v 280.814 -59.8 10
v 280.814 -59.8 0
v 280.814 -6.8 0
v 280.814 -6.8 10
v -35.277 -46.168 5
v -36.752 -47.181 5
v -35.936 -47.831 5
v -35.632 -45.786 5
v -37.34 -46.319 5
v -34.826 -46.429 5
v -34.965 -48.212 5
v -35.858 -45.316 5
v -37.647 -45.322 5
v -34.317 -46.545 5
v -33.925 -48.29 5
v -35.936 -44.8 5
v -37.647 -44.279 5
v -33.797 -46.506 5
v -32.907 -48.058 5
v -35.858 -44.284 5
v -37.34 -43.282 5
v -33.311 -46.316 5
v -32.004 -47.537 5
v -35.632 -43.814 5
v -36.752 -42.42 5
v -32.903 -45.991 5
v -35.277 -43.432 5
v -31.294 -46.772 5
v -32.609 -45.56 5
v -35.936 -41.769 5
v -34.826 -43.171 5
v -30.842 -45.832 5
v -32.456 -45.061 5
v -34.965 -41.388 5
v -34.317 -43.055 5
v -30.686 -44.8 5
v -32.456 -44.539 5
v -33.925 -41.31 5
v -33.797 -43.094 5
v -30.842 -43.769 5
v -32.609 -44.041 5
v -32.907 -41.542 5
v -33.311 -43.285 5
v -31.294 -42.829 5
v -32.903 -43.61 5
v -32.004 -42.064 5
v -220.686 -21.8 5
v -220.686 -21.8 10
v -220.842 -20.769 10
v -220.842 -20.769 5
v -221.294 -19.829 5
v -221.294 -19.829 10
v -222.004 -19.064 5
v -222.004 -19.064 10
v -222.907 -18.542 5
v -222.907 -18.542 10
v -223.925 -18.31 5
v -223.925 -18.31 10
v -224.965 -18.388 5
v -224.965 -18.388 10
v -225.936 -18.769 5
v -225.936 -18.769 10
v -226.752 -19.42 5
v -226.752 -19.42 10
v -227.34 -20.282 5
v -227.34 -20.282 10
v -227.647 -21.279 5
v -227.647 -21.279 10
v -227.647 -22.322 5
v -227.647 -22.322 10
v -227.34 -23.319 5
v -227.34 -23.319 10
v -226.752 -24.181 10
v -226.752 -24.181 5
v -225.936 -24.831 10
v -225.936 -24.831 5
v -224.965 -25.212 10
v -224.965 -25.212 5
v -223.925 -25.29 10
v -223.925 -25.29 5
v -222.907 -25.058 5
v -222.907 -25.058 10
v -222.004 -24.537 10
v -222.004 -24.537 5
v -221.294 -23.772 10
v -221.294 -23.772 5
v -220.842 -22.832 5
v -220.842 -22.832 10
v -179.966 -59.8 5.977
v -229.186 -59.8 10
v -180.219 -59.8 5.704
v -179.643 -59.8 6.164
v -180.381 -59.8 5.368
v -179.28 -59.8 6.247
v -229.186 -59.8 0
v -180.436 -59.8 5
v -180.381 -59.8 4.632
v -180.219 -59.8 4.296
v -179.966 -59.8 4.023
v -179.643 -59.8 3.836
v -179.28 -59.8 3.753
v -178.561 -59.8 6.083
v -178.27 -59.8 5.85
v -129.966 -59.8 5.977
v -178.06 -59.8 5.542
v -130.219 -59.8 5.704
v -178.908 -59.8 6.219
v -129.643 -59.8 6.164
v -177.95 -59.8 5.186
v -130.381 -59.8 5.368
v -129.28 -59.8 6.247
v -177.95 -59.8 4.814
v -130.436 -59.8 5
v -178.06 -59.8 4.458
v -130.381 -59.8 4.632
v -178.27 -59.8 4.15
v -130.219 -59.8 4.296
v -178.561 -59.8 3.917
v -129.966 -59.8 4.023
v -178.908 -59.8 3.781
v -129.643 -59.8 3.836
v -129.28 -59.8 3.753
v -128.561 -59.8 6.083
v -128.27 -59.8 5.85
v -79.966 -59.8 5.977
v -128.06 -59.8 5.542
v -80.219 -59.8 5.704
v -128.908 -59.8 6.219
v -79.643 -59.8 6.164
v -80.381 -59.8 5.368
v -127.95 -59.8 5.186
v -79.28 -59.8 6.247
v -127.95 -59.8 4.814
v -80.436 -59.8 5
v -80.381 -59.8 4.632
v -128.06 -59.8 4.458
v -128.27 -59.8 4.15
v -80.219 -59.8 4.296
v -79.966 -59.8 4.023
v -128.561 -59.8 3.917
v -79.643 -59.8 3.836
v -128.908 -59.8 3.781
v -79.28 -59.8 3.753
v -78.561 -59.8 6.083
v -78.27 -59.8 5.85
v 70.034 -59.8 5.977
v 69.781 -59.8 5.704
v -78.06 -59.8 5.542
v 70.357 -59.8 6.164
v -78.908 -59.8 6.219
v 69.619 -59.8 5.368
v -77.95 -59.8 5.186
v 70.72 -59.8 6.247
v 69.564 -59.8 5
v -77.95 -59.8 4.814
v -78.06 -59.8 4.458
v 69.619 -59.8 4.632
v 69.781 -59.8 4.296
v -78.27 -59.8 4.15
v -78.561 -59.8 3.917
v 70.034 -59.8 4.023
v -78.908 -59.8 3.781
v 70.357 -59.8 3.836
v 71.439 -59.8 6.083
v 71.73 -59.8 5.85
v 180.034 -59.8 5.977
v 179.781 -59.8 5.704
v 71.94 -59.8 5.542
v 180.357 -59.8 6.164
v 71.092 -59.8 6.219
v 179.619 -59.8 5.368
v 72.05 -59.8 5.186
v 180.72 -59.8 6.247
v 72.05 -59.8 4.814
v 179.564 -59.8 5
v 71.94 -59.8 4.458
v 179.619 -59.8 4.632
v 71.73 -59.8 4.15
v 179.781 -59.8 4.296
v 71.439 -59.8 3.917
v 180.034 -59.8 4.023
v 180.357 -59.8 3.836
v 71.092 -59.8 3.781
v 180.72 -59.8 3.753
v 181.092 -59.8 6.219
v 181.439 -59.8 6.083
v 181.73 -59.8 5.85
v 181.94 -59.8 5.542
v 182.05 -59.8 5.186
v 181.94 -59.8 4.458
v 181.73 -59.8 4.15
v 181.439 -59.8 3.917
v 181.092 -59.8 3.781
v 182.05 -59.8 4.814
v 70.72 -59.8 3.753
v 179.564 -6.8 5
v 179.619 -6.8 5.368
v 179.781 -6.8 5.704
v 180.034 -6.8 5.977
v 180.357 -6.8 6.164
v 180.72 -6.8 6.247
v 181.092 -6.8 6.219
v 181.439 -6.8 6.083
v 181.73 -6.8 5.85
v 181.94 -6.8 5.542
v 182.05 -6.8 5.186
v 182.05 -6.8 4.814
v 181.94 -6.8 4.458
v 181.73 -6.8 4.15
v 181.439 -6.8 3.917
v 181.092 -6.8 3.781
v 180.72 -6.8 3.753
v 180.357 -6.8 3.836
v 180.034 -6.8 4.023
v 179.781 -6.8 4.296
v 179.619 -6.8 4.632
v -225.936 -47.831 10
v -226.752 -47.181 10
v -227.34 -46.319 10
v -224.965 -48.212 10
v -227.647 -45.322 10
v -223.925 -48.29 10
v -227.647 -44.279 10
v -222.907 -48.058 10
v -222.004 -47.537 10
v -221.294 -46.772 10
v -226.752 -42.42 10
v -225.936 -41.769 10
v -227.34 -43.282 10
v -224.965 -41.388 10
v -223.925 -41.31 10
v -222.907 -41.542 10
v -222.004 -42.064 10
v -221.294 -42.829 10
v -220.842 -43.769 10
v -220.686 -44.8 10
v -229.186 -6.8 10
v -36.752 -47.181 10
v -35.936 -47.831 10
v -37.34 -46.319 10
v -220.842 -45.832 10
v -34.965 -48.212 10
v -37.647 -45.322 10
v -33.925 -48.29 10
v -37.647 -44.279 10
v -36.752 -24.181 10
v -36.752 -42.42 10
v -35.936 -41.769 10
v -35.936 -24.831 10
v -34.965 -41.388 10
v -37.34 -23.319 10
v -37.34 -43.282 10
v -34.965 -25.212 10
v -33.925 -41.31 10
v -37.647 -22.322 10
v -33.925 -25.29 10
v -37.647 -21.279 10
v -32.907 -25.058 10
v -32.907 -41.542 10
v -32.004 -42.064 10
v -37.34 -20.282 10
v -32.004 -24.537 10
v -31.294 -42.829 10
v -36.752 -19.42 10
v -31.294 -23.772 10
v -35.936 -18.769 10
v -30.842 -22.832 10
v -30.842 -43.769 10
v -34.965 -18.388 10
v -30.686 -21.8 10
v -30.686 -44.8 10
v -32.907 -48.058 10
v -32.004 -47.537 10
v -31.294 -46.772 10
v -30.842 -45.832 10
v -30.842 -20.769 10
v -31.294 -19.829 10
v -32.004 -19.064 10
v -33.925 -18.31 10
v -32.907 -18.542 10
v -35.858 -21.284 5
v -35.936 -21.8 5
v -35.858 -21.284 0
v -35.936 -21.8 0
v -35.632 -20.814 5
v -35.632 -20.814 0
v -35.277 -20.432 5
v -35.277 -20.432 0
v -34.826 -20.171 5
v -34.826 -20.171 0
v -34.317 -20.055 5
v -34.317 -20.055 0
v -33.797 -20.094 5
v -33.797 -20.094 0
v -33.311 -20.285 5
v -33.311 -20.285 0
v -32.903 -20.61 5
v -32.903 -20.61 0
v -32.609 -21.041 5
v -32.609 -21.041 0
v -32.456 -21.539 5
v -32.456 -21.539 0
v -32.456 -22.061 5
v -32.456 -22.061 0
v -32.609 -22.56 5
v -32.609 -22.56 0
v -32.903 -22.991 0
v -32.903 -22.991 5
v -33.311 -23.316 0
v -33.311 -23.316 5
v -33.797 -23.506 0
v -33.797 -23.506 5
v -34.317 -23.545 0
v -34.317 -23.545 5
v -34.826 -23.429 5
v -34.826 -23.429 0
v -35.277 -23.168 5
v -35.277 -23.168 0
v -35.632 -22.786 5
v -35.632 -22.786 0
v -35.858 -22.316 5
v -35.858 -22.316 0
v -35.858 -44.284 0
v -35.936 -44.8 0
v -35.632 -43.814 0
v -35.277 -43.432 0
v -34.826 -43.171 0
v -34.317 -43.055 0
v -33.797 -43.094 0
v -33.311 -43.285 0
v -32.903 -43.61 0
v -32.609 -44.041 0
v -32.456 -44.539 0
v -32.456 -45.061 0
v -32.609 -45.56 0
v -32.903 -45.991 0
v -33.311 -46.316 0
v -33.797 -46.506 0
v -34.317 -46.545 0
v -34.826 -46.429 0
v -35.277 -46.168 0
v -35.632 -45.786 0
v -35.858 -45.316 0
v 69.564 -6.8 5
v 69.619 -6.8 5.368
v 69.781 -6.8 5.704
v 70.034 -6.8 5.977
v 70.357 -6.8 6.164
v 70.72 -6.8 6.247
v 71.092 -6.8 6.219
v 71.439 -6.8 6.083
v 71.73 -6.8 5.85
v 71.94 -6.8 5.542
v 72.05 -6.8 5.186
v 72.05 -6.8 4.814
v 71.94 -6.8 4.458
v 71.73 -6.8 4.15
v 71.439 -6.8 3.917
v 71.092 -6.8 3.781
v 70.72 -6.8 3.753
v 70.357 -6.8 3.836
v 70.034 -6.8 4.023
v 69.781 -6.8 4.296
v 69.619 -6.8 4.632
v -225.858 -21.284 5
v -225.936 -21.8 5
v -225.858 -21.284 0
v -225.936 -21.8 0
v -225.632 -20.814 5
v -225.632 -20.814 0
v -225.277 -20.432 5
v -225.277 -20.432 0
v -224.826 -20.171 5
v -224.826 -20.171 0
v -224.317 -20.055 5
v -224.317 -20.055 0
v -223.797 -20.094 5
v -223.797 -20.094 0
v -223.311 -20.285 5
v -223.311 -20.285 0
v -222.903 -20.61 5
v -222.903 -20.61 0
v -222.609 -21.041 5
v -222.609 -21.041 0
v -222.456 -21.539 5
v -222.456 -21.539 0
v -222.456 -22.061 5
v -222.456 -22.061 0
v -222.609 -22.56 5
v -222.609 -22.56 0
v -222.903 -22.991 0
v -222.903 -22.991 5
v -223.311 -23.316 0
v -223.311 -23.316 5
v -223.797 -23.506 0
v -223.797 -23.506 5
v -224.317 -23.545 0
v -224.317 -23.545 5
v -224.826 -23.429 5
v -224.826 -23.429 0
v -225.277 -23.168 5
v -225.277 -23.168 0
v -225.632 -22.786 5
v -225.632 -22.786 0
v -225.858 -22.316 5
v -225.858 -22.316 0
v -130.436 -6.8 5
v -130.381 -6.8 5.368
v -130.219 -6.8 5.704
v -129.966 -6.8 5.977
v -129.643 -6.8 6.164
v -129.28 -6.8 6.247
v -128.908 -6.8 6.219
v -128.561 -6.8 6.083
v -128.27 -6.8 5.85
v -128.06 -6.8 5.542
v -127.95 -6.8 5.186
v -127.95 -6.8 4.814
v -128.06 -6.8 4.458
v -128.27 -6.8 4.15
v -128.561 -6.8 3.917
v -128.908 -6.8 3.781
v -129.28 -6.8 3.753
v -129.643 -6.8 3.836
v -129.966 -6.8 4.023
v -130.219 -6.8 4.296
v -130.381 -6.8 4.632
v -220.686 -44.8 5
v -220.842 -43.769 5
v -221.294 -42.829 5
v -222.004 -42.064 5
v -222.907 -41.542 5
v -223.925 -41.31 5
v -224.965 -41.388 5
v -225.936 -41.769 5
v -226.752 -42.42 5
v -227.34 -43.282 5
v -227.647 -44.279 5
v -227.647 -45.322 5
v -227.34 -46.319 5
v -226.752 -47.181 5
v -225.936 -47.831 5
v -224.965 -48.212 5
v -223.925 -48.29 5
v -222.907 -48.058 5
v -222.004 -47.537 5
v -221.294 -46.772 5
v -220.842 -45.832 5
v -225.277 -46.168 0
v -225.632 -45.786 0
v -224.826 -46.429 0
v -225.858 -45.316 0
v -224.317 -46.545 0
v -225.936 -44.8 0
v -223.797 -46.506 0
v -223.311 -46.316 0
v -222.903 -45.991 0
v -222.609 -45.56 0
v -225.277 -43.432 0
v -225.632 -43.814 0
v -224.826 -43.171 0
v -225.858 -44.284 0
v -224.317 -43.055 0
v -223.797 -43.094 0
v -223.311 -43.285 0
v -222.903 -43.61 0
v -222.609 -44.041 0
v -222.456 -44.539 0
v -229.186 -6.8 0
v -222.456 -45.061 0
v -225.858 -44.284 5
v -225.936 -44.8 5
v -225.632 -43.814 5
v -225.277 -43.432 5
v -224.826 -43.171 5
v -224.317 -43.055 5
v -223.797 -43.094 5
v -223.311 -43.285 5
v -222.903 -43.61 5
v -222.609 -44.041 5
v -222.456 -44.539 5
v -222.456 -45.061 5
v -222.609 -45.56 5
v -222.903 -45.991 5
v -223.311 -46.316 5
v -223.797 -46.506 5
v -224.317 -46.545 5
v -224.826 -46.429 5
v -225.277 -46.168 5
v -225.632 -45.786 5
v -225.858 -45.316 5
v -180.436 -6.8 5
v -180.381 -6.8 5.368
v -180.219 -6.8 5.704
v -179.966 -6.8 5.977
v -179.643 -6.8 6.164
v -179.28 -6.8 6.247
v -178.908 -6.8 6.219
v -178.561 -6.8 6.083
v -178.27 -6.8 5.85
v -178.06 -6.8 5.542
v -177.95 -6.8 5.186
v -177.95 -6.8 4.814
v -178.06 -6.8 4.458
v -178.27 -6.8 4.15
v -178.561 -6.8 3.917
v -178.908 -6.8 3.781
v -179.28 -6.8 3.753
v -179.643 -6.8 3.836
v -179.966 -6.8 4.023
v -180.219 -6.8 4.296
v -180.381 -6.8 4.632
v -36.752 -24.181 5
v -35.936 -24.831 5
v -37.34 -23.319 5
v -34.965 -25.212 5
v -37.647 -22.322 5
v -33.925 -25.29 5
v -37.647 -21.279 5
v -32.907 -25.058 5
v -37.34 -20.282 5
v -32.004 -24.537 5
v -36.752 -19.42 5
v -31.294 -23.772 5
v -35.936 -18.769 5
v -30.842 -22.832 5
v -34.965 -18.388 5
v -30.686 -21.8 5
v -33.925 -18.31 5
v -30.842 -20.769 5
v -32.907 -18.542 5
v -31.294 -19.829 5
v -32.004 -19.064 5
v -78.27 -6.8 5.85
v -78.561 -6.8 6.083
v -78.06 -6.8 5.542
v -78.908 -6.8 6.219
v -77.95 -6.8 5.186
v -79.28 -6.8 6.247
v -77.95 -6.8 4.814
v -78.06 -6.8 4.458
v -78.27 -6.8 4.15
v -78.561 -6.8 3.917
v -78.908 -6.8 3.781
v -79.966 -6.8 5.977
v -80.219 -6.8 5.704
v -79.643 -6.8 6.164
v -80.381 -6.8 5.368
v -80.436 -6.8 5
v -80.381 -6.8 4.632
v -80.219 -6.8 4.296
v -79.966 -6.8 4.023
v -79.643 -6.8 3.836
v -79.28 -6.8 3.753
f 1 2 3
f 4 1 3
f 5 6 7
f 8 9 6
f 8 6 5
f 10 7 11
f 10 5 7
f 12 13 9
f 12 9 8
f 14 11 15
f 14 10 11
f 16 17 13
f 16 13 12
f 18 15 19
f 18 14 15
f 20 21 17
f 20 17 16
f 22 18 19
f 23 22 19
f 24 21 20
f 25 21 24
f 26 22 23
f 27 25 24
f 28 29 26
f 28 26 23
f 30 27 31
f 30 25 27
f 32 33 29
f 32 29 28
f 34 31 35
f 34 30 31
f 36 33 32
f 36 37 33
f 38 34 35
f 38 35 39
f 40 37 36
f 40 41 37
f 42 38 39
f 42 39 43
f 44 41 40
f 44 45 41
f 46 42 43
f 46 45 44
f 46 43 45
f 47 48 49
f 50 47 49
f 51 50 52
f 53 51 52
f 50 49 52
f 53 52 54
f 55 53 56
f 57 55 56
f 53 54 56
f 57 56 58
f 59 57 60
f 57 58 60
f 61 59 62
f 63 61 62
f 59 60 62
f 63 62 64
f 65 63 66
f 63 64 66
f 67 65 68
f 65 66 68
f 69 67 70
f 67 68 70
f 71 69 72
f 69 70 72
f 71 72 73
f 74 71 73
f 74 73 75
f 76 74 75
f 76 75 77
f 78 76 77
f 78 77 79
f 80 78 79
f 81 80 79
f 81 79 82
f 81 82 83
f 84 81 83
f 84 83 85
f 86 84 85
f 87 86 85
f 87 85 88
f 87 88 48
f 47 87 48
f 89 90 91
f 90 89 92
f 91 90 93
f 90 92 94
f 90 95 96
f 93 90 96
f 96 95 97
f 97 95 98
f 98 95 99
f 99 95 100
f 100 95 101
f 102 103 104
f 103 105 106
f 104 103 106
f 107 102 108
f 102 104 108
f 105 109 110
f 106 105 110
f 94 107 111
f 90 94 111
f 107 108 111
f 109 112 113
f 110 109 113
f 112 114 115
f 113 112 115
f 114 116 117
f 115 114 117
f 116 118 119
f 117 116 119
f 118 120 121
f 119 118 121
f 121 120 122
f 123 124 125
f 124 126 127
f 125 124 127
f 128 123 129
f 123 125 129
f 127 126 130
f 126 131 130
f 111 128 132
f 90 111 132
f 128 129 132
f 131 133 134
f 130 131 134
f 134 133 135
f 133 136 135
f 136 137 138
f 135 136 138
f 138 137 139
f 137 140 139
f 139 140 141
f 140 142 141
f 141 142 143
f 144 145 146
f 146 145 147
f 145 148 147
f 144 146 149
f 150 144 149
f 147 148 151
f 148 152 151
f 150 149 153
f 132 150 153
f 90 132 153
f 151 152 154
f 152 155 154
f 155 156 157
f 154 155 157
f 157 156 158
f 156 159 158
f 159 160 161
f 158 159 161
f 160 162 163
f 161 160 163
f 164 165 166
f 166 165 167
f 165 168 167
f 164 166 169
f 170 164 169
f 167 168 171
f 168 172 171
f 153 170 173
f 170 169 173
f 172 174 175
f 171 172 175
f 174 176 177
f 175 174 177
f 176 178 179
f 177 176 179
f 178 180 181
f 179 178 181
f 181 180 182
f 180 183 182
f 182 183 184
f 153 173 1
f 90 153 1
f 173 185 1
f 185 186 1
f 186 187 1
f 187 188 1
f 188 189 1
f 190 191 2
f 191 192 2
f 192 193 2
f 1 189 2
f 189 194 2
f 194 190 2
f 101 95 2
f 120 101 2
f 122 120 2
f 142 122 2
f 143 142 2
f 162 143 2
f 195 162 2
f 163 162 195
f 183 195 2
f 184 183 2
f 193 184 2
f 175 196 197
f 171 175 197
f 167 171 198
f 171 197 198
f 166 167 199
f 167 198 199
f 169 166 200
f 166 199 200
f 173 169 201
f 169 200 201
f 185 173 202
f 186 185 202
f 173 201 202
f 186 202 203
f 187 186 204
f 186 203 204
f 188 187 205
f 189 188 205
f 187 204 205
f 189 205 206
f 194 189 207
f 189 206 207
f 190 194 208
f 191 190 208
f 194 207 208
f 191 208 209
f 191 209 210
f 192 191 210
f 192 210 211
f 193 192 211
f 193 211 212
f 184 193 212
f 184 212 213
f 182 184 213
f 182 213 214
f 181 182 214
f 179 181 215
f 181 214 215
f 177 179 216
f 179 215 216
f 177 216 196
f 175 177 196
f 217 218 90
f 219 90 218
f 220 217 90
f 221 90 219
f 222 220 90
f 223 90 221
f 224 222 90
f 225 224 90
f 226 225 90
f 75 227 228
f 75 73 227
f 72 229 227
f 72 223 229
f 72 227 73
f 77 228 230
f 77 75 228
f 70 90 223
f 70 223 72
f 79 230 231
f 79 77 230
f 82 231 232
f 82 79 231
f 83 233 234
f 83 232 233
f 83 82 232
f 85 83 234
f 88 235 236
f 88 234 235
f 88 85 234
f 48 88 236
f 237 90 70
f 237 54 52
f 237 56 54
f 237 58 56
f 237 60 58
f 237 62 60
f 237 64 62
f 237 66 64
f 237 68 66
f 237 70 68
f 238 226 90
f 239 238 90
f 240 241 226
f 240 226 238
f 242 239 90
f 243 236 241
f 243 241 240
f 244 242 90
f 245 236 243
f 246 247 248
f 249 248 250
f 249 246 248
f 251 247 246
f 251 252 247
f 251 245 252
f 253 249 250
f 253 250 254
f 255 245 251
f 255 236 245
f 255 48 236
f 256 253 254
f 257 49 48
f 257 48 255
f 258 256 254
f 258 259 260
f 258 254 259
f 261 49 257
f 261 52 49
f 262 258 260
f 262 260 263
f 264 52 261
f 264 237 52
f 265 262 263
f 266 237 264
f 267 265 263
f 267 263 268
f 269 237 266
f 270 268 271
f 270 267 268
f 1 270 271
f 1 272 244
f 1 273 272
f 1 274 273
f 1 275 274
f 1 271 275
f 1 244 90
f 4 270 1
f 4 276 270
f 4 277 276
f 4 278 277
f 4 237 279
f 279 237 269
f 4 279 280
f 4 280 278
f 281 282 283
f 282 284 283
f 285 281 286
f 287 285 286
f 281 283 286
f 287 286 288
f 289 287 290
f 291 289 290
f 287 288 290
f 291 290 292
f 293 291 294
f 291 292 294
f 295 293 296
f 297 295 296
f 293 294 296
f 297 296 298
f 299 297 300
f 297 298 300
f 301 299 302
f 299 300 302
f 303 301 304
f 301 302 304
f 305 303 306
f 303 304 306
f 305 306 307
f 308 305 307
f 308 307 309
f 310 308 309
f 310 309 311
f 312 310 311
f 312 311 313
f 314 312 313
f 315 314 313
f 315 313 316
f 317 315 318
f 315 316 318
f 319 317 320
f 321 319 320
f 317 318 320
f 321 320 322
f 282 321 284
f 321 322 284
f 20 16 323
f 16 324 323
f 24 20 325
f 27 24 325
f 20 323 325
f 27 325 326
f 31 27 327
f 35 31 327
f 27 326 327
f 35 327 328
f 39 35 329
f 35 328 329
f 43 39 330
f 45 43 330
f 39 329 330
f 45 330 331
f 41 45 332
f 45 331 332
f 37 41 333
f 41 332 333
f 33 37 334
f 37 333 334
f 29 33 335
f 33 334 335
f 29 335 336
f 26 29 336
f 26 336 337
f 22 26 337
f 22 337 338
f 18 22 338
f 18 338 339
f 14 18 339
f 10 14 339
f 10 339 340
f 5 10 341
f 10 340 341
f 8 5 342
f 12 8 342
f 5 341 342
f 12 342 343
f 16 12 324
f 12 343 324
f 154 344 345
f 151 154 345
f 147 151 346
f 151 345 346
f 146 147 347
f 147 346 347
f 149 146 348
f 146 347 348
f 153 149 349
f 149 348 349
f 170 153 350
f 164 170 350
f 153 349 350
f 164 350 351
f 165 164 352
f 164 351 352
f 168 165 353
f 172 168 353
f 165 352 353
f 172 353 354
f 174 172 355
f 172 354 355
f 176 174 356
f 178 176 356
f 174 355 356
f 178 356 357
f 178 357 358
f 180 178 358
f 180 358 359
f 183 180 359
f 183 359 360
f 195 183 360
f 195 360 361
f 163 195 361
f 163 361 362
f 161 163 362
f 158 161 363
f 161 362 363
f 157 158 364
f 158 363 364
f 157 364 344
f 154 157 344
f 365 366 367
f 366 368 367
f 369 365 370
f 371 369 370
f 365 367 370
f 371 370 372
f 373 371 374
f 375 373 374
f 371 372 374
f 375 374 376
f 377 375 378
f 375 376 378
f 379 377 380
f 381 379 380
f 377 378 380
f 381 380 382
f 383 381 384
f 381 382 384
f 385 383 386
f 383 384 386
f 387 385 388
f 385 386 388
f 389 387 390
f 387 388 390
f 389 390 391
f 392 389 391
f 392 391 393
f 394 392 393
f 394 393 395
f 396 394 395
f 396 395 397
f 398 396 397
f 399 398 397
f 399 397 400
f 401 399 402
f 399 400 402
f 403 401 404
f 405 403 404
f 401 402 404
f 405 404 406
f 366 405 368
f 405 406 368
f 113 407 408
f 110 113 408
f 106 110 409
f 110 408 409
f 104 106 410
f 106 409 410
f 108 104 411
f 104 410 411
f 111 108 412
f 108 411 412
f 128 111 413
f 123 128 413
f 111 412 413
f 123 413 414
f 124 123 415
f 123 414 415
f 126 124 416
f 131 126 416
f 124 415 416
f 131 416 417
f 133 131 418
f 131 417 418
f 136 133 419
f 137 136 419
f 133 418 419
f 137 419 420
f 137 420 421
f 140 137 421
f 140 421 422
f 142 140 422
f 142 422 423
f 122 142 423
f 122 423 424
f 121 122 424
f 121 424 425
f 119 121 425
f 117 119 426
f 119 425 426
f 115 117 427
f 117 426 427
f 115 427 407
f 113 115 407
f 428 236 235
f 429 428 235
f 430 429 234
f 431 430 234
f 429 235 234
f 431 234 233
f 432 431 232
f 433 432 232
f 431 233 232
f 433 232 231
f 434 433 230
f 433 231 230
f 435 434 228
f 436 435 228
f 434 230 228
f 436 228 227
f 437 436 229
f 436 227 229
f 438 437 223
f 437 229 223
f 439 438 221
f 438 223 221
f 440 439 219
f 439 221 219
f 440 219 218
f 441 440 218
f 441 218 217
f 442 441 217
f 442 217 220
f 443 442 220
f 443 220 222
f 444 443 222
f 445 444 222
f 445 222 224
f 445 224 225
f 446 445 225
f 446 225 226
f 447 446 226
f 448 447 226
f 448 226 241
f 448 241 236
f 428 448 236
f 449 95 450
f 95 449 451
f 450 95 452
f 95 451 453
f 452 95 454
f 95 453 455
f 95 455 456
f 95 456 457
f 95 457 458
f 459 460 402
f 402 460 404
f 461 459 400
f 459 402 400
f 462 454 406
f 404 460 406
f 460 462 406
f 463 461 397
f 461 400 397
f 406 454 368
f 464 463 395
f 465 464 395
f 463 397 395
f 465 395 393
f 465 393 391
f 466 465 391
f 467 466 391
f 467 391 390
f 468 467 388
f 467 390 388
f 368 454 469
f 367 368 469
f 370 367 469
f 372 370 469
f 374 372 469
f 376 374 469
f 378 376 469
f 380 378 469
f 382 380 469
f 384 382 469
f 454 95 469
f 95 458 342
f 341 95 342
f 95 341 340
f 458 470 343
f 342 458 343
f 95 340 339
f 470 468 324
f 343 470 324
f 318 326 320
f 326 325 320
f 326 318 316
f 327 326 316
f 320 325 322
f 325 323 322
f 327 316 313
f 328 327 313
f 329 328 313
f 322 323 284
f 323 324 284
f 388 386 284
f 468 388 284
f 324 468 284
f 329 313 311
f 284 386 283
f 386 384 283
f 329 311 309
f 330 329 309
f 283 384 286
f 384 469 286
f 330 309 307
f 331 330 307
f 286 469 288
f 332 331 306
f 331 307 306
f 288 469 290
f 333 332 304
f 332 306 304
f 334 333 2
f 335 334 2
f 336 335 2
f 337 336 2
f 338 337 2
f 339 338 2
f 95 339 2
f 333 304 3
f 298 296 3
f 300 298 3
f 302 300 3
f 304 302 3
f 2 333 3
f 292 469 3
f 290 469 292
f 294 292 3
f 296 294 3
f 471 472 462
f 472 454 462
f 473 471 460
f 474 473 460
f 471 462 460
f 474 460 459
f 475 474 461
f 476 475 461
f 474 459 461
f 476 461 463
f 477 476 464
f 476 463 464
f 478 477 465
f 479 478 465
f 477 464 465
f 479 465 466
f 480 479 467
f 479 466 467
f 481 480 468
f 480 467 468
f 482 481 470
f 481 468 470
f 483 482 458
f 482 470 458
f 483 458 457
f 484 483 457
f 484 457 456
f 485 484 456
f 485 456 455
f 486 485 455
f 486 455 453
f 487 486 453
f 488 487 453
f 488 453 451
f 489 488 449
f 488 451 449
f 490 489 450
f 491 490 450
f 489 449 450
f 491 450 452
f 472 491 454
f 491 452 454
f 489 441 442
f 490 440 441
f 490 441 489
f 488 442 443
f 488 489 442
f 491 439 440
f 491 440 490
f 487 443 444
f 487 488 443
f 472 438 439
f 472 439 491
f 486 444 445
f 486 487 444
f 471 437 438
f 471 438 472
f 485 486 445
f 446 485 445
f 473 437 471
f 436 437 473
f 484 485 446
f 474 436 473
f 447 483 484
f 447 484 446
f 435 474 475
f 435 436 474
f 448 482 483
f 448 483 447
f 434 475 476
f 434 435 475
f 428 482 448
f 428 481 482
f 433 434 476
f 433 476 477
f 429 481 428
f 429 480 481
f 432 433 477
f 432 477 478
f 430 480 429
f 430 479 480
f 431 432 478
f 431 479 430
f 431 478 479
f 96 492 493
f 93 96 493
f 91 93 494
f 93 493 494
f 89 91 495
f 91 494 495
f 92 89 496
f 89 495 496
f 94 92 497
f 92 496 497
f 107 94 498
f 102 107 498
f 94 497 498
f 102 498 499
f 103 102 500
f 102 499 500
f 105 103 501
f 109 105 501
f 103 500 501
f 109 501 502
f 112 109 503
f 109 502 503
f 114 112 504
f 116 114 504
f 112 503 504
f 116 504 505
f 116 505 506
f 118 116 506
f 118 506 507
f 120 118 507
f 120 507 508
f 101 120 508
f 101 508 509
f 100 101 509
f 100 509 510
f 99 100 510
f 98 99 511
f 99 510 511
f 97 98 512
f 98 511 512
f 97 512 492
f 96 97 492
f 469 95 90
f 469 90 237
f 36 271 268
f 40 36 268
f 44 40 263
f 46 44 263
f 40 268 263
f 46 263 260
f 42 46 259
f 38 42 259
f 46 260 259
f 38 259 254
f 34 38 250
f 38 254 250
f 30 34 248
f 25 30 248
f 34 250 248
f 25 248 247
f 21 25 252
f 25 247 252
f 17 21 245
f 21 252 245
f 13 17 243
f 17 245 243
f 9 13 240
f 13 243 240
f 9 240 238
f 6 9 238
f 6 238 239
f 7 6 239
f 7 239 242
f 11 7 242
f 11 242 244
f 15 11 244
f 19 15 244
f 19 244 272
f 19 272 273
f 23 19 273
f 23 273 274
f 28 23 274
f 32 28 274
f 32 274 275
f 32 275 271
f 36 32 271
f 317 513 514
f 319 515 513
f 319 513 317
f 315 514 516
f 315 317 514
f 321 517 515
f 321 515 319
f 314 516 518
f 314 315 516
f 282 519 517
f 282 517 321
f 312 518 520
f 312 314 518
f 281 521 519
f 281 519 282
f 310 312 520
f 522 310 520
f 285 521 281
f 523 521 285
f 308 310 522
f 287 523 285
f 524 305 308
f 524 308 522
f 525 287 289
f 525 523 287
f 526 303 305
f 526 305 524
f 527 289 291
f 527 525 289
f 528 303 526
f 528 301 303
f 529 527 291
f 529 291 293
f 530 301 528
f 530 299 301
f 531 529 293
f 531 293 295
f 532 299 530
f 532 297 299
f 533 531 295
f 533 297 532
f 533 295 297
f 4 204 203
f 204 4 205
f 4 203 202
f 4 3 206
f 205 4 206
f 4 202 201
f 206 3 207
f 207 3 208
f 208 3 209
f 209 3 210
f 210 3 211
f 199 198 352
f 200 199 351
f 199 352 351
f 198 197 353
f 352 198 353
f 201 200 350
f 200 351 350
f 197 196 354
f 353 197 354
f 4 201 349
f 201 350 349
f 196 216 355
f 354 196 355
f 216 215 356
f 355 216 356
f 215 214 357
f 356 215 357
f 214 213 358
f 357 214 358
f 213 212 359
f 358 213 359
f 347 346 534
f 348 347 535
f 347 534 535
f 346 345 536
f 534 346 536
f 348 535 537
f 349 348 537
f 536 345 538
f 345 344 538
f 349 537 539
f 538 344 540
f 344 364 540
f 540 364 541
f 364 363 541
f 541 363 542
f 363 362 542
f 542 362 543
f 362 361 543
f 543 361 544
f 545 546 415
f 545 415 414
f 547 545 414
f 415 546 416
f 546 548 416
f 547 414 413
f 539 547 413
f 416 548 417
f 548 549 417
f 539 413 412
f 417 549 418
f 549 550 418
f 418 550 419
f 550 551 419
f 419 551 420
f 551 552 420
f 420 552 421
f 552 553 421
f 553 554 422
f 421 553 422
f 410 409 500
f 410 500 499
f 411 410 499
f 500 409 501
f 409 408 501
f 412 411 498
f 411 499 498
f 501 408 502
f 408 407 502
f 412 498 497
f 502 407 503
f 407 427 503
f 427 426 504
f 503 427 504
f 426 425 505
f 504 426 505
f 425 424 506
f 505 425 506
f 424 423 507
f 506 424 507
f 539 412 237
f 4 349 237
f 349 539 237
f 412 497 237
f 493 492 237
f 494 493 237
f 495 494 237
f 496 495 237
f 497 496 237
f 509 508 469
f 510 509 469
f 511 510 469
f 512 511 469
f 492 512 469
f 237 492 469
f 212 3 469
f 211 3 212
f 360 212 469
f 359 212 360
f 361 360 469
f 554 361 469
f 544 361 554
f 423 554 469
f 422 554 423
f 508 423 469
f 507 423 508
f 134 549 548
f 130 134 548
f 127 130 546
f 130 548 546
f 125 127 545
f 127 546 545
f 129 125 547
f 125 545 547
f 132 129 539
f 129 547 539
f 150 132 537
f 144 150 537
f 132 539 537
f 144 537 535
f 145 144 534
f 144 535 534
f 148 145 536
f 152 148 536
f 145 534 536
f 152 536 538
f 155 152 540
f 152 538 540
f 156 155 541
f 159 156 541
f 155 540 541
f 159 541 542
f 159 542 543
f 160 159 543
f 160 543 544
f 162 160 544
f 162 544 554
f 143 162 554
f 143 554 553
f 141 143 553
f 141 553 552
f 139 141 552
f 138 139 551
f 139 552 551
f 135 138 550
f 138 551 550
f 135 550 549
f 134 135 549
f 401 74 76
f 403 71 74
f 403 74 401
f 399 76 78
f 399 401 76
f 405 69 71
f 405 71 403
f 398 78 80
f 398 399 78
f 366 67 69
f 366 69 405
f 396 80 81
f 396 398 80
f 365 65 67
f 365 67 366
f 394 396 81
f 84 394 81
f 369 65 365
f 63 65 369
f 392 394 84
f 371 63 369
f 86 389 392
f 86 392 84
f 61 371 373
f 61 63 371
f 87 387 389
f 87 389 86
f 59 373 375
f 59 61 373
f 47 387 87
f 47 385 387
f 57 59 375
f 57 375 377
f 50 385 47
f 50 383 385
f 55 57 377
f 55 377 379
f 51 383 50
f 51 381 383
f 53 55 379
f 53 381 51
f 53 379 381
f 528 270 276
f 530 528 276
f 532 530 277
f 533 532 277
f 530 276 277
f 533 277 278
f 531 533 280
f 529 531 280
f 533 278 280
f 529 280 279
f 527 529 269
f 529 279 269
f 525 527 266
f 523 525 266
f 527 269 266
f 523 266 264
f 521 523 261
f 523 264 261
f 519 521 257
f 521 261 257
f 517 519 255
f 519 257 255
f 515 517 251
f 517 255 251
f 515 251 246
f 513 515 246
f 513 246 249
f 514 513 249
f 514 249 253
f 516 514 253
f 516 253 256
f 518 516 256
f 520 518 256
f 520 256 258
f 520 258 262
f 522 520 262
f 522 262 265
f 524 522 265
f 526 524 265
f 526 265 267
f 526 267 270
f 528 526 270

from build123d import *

# Parameters (mm, degrees)
F0_W           = 10
F0_H           = 53
F0_W_2         = 180
F0_W_3         = 310
F1_DEPTH       = 10
F3_D           = 3.5
F3_CBORE_D     = 7
F3_CBORE_DEPTH = 5
F4_R           = 1.25
F5_DEPTH       = 53


# Not quite as in the source:
# - a feature names something its author has since deleted; it is built from what else it names


with BuildPart() as f1:
    # F0 (on Top) → F1 (new body)
    with BuildSketch(Plane.XY):
        with Locations((-224.1861552, -33.3002303571)):
            Rectangle(F0_W, F0_H)
        with Locations((-129.1861552, -33.3002303571)):
            Rectangle(F0_W_2, F0_H)
        with Locations((-34.1861552, -33.3002303571)):
            Rectangle(F0_W, F0_H)
        with Locations((125.8138448, -33.3002303571)):
            Rectangle(F0_W_3, F0_H)
    extrude(amount=F1_DEPTH)

    # F3 (through all)
    with Locations(Plane.XY.offset(10)):
        with Locations((-224.1861552, -21.8002303571), (-224.1861552, -44.8002303571), (-34.1861620545, -21.8002303571), (-34.1861620545, -44.8002303571)):
            CounterBoreHole(F3_D / 2, F3_CBORE_D / 2, F3_CBORE_DEPTH)

    # F4 (on face) → F5 (cut, through all)
    with BuildSketch(Plane(origin=(0, -6.8002303571, 0), x_dir=(-1, 0, 0), z_dir=(0, 1, 0))):
        with Locations((-180.8138448, 5)):
            Circle(F4_R)
        with Locations((-70.8138448, 5)):
            Circle(F4_R)
        with Locations((79.1861552, 5)):
            Circle(F4_R)
        with Locations((129.1861552, 5)):
            Circle(F4_R)
        with Locations((179.1861552, 5)):
            Circle(F4_R)
    extrude(amount=-F5_DEPTH, mode=Mode.SUBTRACT)


solid = f1.part
